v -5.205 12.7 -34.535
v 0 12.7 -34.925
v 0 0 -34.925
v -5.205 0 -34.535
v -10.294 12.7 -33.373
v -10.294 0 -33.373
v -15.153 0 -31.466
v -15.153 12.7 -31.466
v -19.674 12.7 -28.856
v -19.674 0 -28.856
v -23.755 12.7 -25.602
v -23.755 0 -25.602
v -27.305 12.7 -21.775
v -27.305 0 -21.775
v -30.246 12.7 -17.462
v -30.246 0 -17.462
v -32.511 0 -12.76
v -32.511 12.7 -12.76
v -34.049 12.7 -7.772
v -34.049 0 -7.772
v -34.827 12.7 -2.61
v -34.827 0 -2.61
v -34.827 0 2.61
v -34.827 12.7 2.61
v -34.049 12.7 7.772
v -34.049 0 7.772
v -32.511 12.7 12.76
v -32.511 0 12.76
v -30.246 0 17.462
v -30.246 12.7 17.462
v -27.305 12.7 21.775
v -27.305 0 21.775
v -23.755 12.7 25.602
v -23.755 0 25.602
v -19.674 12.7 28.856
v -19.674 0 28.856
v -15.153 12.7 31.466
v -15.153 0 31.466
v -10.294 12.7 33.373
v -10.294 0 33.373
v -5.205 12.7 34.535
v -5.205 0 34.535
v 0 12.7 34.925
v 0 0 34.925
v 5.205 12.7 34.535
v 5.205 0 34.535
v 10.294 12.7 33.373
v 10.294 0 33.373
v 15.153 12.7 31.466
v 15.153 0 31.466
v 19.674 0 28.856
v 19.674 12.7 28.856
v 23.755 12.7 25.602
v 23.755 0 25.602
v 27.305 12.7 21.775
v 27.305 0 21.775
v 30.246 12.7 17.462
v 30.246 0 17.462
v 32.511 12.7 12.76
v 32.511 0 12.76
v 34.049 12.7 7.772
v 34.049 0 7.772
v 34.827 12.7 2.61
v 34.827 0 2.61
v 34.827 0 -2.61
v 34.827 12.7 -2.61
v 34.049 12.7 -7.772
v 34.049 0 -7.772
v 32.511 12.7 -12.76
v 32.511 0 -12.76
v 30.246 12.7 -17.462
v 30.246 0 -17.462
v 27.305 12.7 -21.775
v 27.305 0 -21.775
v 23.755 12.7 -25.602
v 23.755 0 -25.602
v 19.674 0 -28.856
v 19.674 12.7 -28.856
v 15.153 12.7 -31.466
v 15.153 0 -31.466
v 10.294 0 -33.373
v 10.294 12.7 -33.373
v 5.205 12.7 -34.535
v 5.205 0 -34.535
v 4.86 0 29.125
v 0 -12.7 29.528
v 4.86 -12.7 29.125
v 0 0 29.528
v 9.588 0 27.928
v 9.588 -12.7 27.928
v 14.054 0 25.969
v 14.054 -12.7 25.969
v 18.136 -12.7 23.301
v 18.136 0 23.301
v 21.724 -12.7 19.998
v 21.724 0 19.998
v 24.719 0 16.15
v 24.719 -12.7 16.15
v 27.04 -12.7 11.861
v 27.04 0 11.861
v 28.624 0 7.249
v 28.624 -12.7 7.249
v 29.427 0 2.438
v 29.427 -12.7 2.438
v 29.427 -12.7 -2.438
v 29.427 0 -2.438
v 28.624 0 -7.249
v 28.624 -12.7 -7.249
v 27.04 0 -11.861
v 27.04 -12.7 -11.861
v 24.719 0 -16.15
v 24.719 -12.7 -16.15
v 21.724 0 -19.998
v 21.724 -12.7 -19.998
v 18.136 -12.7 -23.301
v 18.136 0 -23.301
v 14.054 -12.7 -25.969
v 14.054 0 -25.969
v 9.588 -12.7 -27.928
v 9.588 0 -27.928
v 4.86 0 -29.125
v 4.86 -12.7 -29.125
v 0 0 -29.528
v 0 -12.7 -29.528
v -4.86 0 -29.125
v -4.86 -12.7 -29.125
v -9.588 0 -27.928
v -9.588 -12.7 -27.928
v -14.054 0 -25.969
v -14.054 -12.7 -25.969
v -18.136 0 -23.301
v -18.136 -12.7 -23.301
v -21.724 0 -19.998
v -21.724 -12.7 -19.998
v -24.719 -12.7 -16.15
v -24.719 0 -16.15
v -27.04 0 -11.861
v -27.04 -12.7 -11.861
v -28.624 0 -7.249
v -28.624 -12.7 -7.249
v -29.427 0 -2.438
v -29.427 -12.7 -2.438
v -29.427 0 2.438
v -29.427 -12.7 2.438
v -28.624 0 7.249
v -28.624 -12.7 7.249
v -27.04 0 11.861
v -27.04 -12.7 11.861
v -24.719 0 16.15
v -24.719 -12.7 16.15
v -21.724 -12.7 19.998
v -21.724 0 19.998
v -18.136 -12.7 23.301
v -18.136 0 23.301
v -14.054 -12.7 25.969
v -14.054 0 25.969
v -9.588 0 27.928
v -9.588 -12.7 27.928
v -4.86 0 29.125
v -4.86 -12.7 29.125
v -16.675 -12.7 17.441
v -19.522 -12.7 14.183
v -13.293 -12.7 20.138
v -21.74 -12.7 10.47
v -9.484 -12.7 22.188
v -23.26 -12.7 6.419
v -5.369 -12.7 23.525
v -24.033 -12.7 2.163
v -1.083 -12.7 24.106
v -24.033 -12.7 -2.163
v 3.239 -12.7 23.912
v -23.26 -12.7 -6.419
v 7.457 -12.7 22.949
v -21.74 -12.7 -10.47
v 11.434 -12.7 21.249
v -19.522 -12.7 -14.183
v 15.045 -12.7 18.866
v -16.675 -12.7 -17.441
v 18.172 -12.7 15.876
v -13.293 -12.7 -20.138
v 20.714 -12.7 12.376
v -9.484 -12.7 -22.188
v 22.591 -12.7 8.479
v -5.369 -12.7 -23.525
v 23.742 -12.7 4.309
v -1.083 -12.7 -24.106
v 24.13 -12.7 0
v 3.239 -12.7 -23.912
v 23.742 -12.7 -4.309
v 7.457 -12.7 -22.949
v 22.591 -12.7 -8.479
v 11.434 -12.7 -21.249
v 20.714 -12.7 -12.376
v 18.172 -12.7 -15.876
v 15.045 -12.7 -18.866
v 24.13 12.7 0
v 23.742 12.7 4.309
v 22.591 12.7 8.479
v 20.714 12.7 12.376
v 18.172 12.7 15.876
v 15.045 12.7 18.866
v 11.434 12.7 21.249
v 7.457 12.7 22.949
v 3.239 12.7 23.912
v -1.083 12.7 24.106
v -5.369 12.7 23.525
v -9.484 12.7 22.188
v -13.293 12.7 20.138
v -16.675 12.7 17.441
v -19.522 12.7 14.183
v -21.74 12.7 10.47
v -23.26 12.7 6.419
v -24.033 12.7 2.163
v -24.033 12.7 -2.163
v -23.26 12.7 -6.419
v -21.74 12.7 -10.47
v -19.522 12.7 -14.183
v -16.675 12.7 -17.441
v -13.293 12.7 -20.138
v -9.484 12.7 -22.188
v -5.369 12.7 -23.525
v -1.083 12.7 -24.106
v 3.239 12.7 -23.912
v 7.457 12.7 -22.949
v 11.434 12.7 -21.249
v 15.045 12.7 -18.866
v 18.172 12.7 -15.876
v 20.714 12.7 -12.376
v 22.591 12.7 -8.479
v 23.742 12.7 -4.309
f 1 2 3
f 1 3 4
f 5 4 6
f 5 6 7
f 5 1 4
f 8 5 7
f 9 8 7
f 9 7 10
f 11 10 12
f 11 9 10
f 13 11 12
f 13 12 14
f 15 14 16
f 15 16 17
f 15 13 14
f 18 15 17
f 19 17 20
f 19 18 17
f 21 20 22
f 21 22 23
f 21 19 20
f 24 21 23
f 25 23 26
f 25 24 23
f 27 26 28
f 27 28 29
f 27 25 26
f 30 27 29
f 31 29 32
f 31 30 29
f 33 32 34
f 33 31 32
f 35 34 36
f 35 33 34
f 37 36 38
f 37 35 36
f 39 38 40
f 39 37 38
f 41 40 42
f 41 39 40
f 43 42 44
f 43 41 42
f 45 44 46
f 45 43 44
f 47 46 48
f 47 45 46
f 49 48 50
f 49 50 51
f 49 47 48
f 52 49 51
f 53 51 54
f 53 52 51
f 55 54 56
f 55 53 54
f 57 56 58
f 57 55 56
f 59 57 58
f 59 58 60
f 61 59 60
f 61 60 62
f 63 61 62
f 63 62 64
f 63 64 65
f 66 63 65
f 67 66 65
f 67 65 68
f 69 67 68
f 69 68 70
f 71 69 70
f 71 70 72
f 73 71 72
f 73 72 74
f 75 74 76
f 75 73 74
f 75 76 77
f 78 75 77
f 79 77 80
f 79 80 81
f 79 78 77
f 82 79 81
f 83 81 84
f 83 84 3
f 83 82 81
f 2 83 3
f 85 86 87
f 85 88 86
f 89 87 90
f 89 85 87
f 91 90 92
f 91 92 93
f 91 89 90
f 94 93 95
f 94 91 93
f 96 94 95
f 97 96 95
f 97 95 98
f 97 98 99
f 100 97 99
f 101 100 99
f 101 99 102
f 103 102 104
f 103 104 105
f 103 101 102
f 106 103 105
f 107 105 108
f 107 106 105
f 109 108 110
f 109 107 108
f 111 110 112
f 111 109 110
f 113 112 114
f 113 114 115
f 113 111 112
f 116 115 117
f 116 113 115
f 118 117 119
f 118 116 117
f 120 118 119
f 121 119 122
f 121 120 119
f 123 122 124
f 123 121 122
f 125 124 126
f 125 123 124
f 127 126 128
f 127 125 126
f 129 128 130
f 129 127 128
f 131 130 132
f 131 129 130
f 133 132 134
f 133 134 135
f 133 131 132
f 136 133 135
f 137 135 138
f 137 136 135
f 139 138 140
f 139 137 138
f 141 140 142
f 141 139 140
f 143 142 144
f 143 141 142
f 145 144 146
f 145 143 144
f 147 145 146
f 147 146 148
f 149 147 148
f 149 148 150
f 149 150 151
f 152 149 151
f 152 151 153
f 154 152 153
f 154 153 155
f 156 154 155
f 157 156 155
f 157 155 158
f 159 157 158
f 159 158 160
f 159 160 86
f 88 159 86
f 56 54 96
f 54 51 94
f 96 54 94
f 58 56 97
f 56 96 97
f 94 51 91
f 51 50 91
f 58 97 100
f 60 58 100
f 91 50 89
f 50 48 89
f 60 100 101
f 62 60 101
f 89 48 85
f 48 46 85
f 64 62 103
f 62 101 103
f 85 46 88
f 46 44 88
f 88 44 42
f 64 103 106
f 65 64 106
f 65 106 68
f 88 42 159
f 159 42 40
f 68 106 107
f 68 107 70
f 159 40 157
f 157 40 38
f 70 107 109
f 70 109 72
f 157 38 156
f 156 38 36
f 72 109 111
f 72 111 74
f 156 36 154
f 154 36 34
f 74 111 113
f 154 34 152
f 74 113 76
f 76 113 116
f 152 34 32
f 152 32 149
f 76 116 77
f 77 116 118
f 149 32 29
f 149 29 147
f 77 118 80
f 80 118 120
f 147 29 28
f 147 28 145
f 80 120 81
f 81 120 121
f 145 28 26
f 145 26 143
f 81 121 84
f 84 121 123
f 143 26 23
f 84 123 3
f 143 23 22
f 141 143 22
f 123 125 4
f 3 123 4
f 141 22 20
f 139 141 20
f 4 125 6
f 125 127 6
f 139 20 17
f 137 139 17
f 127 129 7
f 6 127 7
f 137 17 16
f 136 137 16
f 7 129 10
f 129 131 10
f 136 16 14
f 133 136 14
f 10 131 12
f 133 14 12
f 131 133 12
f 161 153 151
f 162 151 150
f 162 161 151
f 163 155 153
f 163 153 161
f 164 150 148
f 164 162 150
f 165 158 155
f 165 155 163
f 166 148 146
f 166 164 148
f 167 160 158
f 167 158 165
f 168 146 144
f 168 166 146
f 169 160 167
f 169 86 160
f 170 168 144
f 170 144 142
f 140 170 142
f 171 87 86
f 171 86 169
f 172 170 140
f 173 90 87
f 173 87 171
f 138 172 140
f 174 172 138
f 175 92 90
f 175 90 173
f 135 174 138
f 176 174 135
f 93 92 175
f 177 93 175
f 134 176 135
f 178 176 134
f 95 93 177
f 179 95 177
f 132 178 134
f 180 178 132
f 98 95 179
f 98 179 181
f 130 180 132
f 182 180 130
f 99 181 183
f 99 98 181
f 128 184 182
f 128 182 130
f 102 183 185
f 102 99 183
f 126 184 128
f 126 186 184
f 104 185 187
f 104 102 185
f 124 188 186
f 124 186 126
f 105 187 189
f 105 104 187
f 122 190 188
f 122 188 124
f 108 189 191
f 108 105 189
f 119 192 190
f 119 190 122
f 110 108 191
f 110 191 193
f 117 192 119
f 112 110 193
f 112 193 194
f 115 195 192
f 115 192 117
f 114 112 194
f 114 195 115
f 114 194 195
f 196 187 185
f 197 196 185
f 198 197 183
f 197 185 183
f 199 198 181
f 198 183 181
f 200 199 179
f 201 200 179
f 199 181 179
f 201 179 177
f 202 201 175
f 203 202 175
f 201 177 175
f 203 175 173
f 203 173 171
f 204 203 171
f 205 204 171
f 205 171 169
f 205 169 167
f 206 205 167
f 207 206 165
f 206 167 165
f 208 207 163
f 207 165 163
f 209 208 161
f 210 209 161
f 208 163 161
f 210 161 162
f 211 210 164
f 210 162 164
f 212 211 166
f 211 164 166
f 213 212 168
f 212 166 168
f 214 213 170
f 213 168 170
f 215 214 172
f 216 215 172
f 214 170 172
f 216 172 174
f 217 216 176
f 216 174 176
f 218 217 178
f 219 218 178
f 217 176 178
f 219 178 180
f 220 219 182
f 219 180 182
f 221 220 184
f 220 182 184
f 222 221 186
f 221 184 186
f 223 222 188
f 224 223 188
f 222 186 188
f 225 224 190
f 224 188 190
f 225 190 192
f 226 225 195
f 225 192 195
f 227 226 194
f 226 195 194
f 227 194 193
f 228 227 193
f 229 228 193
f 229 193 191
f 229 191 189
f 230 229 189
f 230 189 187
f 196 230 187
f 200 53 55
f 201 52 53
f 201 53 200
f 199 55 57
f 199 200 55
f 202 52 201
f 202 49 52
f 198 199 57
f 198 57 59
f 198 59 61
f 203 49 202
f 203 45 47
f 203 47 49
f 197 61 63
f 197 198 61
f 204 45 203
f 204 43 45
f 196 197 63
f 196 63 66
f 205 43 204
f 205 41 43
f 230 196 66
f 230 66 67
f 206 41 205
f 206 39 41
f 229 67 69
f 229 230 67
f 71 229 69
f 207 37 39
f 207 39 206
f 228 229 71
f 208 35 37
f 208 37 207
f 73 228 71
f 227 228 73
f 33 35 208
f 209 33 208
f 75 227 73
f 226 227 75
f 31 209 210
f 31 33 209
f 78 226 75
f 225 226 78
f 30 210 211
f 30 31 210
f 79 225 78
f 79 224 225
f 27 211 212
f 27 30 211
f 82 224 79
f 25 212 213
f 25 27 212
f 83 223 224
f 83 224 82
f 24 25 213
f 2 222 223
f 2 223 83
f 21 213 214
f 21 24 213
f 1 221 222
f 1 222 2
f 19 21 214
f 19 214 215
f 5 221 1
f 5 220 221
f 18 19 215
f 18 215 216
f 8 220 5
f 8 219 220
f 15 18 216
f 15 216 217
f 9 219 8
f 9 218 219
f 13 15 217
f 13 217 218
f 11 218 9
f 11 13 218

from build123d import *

# Parameters (mm, degrees)
F0_W     = 12.7
F0_H     = 34.925
F0_H_2   = 29.5275
F3_R     = 24.13
F4_DEPTH = 25.4


with BuildPart() as f1:
    # F0 (on Right) → F1 (revolve)
    with BuildSketch(Plane.YZ):
        with Locations((6.35, -17.4625)):
            Rectangle(F0_W, F0_H)
    revolve(axis=Axis((0, 6.35, 0), (0, 1, 0)))

    # F0 (on Right) → F2 (revolve)
    with BuildSketch(Plane.YZ):
        with Locations((6.35, -17.4625)):
            Rectangle(F0_W, F0_H)
        with Locations((-6.35, 14.76375)):
            Rectangle(F0_W, F0_H_2)
    revolve(axis=Axis((0, 0, 0), (0, 1, 0)))

    # F3 (on face) → F4 (cut)
    with BuildSketch(Plane.XZ.offset(12.7)):
        Circle(F3_R)
    extrude(amount=-F4_DEPTH, mode=Mode.SUBTRACT)


solid = f1.part
